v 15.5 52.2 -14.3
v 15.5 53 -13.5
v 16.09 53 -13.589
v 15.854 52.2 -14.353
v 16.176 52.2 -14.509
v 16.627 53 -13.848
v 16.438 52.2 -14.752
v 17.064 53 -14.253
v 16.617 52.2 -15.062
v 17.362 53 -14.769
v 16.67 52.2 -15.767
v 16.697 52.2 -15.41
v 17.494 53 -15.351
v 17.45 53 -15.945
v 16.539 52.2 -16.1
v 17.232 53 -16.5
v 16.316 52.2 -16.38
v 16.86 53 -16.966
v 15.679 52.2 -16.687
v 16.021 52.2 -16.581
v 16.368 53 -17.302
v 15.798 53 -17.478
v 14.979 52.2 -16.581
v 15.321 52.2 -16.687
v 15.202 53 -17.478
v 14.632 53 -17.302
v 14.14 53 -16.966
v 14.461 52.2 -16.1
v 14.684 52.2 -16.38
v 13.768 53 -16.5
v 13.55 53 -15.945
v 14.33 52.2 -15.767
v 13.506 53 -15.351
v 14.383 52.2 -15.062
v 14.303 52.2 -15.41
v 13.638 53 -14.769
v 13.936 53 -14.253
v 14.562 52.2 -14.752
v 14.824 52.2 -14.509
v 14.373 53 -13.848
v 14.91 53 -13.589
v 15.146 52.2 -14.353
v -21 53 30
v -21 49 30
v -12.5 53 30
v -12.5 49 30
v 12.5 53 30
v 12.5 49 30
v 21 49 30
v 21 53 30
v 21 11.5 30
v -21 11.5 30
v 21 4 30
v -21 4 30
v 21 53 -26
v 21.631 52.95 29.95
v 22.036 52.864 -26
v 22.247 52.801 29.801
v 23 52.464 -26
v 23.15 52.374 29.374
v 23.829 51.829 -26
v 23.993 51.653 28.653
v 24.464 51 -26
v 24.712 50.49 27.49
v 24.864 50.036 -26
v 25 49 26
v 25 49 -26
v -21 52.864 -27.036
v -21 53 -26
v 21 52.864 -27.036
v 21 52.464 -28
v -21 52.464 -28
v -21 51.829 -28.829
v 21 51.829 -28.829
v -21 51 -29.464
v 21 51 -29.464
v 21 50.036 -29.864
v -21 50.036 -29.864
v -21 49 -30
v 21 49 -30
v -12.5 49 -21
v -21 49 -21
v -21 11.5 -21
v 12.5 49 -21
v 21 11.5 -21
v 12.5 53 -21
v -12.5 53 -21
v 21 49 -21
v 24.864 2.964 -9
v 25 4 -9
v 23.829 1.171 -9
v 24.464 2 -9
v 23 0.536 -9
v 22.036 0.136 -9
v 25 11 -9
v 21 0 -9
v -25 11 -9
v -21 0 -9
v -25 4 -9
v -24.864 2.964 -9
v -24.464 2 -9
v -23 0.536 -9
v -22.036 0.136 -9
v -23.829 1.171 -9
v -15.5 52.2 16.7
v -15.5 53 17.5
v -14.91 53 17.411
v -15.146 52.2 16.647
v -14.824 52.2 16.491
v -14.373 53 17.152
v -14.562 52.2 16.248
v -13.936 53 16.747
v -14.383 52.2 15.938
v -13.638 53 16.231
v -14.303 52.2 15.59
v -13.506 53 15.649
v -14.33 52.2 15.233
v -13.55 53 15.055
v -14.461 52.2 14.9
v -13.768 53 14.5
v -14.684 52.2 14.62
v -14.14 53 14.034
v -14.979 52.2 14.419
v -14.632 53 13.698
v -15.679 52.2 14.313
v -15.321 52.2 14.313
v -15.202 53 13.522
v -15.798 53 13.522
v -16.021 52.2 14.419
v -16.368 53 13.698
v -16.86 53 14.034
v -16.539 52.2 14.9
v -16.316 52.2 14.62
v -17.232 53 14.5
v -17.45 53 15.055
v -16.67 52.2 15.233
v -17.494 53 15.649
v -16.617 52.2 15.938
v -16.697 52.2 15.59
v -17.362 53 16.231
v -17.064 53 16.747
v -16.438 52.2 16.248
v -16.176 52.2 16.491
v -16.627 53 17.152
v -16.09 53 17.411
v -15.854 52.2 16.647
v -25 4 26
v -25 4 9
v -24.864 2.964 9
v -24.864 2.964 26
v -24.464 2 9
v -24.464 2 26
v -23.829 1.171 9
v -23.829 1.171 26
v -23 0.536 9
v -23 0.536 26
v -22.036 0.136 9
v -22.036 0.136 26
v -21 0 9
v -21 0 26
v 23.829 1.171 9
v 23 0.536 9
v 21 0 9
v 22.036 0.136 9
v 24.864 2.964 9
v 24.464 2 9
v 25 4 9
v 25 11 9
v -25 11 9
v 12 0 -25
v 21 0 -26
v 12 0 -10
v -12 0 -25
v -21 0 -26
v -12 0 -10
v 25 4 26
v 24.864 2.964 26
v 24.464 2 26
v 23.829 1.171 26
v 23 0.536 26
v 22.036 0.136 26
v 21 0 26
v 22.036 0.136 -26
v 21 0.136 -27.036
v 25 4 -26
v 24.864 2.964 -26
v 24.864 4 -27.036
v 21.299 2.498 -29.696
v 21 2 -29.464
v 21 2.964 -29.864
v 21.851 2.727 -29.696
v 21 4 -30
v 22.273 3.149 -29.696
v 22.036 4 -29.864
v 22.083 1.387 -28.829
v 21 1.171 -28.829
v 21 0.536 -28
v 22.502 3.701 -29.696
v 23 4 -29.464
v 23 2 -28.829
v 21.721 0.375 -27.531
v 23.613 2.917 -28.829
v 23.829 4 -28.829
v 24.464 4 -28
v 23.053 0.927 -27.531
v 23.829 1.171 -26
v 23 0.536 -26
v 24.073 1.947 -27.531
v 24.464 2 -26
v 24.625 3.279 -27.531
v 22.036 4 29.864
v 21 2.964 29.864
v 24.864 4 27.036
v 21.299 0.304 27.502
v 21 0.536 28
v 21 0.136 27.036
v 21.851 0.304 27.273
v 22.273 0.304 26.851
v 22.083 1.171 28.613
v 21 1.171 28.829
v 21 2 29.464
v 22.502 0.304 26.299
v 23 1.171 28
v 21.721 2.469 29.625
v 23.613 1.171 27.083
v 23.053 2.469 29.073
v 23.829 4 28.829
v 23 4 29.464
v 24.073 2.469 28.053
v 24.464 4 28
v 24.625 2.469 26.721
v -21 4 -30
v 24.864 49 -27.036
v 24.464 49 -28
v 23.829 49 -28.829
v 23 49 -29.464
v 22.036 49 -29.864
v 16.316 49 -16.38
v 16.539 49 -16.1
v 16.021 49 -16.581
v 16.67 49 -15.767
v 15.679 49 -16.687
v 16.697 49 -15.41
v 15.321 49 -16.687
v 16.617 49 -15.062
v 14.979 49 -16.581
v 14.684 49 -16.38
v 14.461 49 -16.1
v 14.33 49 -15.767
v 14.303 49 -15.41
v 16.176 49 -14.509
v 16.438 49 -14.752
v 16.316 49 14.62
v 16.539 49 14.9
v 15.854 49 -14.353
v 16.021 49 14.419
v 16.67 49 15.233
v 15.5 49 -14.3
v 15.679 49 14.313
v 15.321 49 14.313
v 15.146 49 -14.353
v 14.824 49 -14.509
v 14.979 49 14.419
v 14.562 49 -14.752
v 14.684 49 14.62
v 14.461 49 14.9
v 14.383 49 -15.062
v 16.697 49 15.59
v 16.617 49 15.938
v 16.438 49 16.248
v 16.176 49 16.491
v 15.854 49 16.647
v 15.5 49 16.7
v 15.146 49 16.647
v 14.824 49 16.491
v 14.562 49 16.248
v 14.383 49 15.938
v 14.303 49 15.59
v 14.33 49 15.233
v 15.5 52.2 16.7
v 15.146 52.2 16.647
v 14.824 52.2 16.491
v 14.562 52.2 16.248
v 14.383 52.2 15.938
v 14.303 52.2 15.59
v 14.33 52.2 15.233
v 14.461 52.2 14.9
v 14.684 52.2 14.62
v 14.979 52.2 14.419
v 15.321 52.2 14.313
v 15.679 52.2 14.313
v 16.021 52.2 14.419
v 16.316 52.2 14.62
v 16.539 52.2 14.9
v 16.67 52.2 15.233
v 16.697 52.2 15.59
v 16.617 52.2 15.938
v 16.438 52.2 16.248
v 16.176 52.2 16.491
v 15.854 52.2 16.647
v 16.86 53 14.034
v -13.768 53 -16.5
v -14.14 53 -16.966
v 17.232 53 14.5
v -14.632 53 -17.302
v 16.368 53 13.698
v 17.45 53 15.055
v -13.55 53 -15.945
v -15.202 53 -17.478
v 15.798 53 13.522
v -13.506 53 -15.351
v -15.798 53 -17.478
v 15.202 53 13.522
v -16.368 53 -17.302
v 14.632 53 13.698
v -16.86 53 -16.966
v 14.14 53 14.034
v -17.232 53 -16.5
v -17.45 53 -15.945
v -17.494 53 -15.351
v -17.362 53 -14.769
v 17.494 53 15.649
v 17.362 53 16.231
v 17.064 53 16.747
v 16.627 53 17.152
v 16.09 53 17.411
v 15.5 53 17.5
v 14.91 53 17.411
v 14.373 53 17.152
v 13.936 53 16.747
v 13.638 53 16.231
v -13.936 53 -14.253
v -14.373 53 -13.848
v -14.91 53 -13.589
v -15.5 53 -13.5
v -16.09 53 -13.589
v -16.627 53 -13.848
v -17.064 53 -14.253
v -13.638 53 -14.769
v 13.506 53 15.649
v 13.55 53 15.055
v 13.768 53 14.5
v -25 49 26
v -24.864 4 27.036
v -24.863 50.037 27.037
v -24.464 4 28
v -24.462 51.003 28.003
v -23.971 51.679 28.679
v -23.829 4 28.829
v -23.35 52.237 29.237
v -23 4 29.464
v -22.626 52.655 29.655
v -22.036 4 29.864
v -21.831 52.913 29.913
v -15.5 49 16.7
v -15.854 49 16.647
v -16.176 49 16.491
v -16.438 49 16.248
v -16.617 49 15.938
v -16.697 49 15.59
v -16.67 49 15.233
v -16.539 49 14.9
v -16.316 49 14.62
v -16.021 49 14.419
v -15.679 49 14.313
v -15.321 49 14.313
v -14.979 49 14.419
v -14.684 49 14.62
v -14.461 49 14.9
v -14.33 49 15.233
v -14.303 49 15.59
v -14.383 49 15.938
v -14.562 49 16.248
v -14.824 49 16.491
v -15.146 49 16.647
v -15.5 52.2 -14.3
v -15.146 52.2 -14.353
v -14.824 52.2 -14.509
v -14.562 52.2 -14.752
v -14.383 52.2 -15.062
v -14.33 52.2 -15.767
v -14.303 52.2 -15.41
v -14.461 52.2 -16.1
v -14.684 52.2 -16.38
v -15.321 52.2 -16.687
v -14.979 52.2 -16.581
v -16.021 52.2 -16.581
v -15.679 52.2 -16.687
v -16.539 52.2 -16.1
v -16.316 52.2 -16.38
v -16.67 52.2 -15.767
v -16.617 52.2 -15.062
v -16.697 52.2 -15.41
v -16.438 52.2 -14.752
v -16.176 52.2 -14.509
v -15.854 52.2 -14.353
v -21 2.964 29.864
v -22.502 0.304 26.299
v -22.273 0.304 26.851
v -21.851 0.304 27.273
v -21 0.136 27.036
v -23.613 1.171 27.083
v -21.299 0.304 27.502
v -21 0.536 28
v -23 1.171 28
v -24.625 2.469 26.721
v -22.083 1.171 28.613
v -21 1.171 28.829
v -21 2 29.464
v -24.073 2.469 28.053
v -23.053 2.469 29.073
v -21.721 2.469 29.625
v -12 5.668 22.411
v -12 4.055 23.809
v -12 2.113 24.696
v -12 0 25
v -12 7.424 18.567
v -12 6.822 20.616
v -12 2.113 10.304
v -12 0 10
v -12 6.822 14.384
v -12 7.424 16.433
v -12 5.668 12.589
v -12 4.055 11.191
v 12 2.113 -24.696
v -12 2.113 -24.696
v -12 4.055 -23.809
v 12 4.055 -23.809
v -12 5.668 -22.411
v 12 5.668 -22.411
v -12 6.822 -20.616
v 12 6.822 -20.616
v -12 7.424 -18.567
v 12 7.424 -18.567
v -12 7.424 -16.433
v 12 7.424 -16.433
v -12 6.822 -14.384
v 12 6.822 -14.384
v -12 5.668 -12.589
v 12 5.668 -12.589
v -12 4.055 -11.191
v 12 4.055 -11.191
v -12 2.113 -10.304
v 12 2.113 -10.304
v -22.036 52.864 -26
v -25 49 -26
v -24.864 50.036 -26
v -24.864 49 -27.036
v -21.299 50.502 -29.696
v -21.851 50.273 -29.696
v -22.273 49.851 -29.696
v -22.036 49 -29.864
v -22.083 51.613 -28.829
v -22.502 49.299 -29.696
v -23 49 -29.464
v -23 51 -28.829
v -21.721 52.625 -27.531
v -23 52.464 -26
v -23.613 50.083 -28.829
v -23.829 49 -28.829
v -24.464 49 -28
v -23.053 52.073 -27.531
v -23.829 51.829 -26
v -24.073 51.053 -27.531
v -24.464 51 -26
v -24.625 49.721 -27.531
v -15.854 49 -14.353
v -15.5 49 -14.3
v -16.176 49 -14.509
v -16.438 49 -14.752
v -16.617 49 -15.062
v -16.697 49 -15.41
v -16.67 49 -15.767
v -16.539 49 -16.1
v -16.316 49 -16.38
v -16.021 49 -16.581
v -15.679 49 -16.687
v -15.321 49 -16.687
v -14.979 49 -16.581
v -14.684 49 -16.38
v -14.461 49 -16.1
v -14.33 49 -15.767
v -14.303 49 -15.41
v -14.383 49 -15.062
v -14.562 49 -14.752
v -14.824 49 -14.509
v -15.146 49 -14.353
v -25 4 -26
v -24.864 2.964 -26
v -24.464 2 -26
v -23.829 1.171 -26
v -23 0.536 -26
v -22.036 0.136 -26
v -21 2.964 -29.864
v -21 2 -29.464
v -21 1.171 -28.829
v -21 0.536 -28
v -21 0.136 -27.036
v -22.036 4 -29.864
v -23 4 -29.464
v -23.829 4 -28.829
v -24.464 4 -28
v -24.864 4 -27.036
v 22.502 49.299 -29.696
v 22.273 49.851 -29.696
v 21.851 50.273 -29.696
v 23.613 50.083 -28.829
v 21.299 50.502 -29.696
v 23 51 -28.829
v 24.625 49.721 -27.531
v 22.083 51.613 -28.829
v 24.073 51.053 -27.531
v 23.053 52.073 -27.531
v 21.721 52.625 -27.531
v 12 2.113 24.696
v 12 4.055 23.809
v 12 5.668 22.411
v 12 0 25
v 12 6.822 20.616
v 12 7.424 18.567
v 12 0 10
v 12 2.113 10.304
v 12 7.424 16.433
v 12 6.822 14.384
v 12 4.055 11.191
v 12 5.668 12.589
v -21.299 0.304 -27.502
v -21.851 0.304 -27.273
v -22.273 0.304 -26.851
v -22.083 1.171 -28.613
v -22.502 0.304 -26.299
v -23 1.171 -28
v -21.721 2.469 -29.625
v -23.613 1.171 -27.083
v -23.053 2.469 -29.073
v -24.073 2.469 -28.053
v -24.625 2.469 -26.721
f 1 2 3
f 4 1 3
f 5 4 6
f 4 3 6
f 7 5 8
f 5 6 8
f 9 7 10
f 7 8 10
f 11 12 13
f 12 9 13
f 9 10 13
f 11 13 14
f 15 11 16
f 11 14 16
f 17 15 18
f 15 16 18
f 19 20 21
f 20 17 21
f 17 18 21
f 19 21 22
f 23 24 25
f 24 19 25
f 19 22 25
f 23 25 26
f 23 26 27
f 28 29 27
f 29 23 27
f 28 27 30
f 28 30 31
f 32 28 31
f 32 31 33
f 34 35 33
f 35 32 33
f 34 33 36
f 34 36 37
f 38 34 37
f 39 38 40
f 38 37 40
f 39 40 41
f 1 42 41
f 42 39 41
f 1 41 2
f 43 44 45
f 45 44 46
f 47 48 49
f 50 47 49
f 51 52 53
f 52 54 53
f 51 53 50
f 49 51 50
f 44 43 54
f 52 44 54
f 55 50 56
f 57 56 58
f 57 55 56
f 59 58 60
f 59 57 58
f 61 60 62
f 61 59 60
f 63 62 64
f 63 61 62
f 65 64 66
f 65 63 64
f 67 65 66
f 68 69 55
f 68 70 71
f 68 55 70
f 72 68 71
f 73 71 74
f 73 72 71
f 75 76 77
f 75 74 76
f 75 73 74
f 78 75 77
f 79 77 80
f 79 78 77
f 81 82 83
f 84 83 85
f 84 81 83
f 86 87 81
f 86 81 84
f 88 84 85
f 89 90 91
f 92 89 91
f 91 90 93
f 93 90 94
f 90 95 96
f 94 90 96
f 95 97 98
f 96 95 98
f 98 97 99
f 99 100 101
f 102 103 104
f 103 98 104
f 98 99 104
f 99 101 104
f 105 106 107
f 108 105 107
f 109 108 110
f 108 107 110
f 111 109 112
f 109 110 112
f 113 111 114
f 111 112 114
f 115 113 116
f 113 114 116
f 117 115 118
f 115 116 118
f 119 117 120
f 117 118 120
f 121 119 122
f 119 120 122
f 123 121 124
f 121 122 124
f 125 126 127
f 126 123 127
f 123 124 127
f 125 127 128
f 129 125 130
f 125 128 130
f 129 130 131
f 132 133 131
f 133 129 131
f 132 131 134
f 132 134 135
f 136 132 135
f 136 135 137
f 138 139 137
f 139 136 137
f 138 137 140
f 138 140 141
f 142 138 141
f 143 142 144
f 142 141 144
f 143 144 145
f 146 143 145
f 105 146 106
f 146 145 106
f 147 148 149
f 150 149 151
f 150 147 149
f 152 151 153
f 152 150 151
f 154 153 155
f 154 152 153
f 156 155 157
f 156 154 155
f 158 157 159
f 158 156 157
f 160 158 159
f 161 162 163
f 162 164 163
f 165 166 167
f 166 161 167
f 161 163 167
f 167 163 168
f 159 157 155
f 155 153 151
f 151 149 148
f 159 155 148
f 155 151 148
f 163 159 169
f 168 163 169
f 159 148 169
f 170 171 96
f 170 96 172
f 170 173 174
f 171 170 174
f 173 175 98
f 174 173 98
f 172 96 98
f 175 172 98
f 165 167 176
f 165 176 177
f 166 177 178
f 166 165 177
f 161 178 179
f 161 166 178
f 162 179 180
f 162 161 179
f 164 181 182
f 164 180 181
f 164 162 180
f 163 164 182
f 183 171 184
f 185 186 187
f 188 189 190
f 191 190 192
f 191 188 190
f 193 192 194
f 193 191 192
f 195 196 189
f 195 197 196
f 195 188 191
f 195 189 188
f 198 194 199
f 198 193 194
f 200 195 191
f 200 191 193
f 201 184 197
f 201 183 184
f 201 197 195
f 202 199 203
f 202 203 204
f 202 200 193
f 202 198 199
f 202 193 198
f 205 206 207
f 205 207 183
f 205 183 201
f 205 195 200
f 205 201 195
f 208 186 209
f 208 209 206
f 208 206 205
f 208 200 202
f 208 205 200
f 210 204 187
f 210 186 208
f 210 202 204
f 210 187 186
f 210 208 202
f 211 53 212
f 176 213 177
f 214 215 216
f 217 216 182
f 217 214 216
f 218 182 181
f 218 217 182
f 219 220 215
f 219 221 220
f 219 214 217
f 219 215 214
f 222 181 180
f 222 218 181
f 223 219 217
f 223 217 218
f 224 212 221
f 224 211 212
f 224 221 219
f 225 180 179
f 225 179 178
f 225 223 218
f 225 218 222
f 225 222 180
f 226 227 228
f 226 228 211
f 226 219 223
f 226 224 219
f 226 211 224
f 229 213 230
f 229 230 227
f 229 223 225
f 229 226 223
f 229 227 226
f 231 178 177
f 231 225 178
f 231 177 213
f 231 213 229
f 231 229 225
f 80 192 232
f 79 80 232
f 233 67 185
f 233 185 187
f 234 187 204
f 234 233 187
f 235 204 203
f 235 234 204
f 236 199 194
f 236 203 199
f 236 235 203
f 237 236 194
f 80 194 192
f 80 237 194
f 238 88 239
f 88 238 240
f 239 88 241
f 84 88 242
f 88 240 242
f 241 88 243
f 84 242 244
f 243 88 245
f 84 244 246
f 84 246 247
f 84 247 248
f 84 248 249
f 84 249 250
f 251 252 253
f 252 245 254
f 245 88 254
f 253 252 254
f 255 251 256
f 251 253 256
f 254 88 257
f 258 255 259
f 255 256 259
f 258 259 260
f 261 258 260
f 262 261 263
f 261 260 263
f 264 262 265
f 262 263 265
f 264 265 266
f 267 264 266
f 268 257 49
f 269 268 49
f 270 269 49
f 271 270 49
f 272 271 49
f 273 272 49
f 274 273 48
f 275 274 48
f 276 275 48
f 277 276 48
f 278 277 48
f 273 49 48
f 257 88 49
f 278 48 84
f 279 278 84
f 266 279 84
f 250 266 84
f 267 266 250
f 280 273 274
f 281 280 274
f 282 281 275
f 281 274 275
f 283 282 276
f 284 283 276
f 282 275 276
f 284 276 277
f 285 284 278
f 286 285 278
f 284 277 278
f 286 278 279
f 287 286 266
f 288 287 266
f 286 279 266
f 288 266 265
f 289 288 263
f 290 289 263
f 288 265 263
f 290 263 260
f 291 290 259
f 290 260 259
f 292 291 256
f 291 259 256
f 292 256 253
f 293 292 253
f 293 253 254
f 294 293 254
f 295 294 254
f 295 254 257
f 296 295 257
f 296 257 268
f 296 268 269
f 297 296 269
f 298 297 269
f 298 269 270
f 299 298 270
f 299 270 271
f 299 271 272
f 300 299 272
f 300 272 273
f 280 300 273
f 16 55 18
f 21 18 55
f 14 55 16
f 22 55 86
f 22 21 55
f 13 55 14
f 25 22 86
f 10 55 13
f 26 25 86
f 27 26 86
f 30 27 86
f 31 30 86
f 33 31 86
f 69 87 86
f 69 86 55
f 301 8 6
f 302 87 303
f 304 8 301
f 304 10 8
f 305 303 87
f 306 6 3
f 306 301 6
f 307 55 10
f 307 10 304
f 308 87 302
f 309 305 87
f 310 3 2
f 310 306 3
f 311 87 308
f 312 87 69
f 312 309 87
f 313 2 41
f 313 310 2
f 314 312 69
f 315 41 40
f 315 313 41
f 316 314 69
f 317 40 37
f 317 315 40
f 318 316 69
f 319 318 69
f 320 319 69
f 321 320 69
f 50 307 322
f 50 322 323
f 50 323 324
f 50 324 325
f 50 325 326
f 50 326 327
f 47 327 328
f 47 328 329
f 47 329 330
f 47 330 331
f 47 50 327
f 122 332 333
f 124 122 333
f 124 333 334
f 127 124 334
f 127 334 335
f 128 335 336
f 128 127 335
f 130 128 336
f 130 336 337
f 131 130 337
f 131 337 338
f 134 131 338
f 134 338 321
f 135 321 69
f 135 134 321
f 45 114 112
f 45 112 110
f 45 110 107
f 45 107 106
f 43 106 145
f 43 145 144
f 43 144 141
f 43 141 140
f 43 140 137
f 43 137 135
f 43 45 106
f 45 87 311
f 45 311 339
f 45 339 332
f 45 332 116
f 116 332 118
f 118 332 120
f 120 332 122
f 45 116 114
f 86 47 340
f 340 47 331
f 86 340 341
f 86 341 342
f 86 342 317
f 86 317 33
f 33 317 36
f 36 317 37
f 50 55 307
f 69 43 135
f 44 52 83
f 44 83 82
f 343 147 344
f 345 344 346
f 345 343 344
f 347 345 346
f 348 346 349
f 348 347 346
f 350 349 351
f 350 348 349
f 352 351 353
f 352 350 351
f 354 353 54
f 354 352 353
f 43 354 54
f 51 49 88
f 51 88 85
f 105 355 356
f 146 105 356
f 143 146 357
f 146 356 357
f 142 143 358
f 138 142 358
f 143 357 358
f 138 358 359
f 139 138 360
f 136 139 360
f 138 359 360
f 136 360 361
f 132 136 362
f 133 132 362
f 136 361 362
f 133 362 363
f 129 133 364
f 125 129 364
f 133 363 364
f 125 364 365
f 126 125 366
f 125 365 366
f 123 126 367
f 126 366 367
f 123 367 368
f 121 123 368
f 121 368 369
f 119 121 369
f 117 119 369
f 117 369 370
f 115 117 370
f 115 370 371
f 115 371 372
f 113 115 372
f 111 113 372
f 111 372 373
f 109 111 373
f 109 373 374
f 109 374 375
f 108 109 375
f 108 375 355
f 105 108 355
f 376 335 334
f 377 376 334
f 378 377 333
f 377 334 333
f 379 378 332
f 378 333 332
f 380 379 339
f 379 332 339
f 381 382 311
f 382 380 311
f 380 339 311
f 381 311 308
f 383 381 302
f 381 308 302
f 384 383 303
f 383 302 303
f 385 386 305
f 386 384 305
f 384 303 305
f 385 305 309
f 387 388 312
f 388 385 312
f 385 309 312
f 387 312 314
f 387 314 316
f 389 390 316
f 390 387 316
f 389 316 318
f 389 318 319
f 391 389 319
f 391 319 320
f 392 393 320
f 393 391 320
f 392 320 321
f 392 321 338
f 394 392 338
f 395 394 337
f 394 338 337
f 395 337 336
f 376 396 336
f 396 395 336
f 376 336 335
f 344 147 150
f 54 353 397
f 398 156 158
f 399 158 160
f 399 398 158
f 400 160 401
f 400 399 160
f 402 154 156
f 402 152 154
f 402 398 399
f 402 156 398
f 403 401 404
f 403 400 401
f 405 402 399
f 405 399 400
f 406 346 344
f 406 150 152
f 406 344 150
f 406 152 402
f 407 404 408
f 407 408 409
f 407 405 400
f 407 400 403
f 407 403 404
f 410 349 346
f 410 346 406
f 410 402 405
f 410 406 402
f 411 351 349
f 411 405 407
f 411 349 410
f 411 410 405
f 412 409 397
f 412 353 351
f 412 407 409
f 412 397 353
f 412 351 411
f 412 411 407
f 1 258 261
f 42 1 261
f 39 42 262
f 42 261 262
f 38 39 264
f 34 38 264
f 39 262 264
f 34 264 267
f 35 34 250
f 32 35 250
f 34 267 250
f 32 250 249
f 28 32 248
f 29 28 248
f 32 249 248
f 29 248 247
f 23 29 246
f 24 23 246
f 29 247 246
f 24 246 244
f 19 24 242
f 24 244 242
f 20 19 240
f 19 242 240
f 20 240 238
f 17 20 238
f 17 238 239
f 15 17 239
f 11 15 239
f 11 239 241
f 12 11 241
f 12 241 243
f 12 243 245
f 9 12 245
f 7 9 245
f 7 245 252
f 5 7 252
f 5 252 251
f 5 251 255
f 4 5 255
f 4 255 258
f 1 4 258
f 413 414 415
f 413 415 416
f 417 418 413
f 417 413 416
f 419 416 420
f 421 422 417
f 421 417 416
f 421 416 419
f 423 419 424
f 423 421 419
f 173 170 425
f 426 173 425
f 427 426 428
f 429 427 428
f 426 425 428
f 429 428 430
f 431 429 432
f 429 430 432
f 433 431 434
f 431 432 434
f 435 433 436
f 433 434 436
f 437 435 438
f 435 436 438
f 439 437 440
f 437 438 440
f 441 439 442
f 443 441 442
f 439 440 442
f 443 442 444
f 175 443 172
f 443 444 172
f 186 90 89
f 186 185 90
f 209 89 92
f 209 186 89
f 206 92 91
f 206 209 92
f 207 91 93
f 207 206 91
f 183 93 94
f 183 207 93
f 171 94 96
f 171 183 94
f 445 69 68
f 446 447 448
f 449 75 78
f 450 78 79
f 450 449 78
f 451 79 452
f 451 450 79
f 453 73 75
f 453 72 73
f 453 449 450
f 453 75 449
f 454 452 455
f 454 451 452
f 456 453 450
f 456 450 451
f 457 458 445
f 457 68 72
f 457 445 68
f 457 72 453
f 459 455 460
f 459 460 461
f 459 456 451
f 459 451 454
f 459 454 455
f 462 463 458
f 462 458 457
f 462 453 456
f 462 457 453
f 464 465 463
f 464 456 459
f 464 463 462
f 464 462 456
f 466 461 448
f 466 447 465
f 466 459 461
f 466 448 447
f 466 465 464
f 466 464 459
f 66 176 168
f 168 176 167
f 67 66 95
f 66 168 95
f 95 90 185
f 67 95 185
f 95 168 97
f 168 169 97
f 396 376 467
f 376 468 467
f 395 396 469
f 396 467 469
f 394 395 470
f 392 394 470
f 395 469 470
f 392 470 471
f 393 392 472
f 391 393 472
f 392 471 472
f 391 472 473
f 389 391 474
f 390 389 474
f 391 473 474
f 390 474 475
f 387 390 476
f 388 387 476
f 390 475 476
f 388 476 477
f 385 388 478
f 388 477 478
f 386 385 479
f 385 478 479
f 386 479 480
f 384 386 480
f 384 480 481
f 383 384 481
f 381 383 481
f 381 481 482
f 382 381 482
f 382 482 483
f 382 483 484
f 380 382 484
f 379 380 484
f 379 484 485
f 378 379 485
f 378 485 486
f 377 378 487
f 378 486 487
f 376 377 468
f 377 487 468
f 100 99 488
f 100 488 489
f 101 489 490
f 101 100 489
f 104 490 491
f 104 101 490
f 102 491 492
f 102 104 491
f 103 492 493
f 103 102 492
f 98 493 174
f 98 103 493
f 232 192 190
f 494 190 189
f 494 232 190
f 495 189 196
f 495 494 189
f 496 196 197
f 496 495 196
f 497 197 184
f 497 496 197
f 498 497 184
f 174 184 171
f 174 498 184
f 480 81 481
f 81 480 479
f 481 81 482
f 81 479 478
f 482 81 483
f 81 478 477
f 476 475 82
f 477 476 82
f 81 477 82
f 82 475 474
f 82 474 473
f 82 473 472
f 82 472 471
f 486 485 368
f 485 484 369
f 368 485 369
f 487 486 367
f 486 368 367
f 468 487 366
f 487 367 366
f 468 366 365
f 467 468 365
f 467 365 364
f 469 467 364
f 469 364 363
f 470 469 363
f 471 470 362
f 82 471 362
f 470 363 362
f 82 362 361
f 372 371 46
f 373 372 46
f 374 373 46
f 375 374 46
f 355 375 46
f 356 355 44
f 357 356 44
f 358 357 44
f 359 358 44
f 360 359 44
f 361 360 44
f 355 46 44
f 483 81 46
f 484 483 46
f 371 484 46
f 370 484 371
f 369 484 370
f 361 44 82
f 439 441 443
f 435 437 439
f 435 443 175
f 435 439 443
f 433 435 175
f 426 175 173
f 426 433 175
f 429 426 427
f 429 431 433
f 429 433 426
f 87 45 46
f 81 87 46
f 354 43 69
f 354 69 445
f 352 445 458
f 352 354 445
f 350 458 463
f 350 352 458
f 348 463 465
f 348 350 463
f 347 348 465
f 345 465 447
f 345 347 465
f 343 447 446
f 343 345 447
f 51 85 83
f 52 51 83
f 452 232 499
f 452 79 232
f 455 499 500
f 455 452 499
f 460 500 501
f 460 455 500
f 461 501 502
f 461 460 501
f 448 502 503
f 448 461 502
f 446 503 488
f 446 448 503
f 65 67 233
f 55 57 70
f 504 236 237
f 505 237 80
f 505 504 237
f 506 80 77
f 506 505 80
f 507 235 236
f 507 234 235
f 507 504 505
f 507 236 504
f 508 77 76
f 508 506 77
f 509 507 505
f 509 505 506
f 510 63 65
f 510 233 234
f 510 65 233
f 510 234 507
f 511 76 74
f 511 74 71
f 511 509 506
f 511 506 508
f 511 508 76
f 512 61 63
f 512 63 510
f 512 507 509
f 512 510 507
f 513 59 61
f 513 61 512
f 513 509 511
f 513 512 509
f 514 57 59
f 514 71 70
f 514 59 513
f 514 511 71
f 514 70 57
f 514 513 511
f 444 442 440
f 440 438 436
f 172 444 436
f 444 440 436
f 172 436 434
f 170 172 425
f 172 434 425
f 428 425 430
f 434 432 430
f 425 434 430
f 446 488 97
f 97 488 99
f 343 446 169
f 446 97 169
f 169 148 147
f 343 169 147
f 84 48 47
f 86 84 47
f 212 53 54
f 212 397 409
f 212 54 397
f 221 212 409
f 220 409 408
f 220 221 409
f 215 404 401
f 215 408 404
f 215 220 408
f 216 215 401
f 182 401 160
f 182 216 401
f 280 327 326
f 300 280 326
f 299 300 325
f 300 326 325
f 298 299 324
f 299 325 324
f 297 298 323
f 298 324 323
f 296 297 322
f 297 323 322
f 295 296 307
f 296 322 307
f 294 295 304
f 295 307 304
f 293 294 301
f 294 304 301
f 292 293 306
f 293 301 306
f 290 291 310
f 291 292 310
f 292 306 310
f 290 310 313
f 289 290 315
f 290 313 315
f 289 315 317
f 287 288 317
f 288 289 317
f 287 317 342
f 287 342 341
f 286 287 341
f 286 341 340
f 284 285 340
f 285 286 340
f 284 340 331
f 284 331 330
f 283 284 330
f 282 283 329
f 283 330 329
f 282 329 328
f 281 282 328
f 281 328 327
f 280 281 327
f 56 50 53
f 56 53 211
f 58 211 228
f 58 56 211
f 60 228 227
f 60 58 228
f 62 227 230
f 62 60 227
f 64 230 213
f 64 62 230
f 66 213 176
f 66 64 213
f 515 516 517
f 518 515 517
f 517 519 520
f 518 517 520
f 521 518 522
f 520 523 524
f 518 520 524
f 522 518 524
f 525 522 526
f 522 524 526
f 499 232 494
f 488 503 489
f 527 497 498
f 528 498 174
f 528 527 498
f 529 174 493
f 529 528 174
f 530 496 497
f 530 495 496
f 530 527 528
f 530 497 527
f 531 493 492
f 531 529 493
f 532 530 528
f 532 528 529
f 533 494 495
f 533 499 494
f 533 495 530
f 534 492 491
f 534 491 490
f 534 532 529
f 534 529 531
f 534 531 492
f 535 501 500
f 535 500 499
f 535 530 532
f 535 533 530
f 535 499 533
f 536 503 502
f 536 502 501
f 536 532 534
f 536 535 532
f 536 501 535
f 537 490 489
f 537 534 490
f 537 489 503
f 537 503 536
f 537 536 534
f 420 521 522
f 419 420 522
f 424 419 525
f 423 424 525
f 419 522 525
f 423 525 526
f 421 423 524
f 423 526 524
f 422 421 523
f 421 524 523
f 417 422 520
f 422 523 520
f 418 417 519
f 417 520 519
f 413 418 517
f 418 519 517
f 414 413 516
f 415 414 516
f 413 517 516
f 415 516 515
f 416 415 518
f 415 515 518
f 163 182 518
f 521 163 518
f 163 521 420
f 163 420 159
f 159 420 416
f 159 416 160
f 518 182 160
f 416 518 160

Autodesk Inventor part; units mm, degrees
ref_plane "YZ Plane" through (0, 0, 0) normal (1, 0, 0) x (0, 1, 0)
ref_plane "XZ Plane" through (0, 0, 0) normal (0, 1, 0) x (-1, 0, 0)
ref_plane "XY Plane" through (0, 0, 0) normal (0, 0, 1) x (1, 0, 0)
sketch "Sketch1" plane through (0, 0, 0) normal (0, 1, 0) x (-1, 0, 0)
  line L0 (-25, -30) -> (25, -30)
  line L1 (25, -30) -> (25, 30)
  line L2 (25, 30) -> (-25, 30)
  line L3 (-25, 30) -> (-25, -30)
  line L4 (-25, -30) -> (25, 30) construction
  line L5 (25, -30) -> (-25, 30) construction
  point P0 (0, 0)
  dimension "d0" = 50
  dimension "d1" = 60
extrude "Extrusion1" add sketch "Sketch1" along normal blind 53
sketch "Sketch2" plane through (-25, 0, 30) normal (0, 0, 1) x (1, 0, 0)
  line L0 (0, 0) -> (0, 53) projected
  line L1 (50, 0) -> (50, 53) projected
  line L2 (0, 53) -> (50, 53)
  line L3 (50, 53) -> (50, 49)
  line L4 (50, 49) -> (0, 49)
  line L5 (0, 49) -> (0, 53)
  line L6 (12.5, 49) -> (37.5, 49)
  line L7 (37.5, 49) -> (37.5, 57)
  line L8 (37.5, 57) -> (12.5, 57)
  line L9 (12.5, 57) -> (12.5, 49)
  line L10 (0, 53) -> (50, 53) projected
  line L11 (12.5, 49) -> (37.5, 57) construction
  line L12 (37.5, 49) -> (12.5, 57) construction
  line L13 (25, 49) -> (25, 11.5)
  line L14 (46, 11.5) -> (4, 11.5)
  line L15 (4, 11.5) -> (4, 49)
  line L16 (4, 49) -> (46, 49)
  line L17 (46, 49) -> (46, 11.5)
  line L18 (46, 11.5) -> (4, 49) construction
  line L19 (4, 11.5) -> (46, 49) construction
  point P0 (25, 0)
  point P1 (25, 53)
  point P2 (25, 30.25)
  point P3 (37.5, 49)
  point P4 (37.5, 53)
  point P5 (12.5, 53)
  point P6 (12.5, 49)
  dimension "d4" = 4
  dimension "d5" = 25
  dimension "d6" = 8
  dimension "d7" = 37.5
  dimension "d8" = 42
extrude "Extrusion2" cut sketch "Sketch2" against normal blind 51 contours L4 L13 L14 L15 | L2 L7 L4 L9 | L4 L17 L14 L13
sketch "Sketch3" plane through (25, 0, 30) normal (1, 0, 0) x (0, 0, -1)
  line L0 (30, 0) -> (12.5, 0)
  line L1 (12.5, 0) -> (47.5, 0)
  line L2 (0, 0) -> (60, 0) projected
  circle A0 centre (12.5, 0) radius 7.5
  circle A1 centre (47.5, 0) radius 7.5
  point P0 (55, 0)
  point P1 (40, 0)
  point P2 (20, 0)
  point P3 (5, 0)
  dimension "d11" = 17.5
  dimension "d12" = 35
  dimension "d13" = 15
  dimension "d14" = 15
extrude "Extrusion3" cut sketch "Sketch3" against normal blind 37 contours L0 L2 A0 | A1 L2 L1 picked at (17.141, 1.7601) picked at (45.1933, 4.395)
extrude "Extrusion4" add sketch "Sketch3" against normal blind 13 contours L0 L2 A0 | A1 L2 L1 picked at (17.141, 1.7601) picked at (45.1933, 4.395)
fillet "Fillet1" radius 4 11 edges at (25, 53, 0) (-25, 53, 0) (25, 26.5, 30) (-25, 26.5, 30) (25, 0, 0) (25, 26.5, -30) (0, 53, -30) (-25, 26.5, -30) (-25, 0, 0) (0, 0, 30) (0, 0, -30)
sketch "Sketch4" plane through (-25, 4, 26) normal (-1, 0, 0) x (0, 0, 1)
  line L0 (-35, -15) -> (-17, -15)
  line L1 (-17, -15) -> (-17, 7)
  line L2 (-17, 7) -> (-35, 7)
  line L3 (-35, 7) -> (-35, -15)
  line L4 (-35, -15) -> (-17, 7) construction
  line L5 (-17, -15) -> (-35, 7) construction
  point P0 (-26, -4)
  dimension "d20" = 18
  dimension "d21" = 22
extrude "Extrusion5" cut sketch "Sketch4" against normal through all
sketch "Sketch5" plane through (0, 53, 0) normal (0, 1, 0) x (1, 0, 0)
  line L0 (-12.5, 21) -> (12.5, 21) projected
  line L1 (0, 21) -> (0, -21)
  line L2 (0, 21) -> (42, 21) construction
  line L3 (15.5, 15.5) -> (-15.5, 15.5)
  line L4 (-15.5, 15.5) -> (-15.5, -15.5)
  line L5 (-15.5, -15.5) -> (15.5, -15.5)
  line L6 (15.5, -15.5) -> (15.5, 15.5)
  line L7 (15.5, 15.5) -> (-15.5, -15.5) construction
  line L8 (-15.5, 15.5) -> (15.5, -15.5) construction
  point P0 (0, 0)
  dimension "d24" = 42
  dimension "d25" = 90
  dimension "d26" = 31
  dimension "d27" = 31
hole "Hole1" at (15.5, 53, 15.5) at (15.5, 53, -15.5) at (-15.5, 53, -15.5) at (-15.5, 53, 15.5) direction (0, -1, 0) diameter 2.4 depth 4 countersink diameter 4 countersink angle 90
properties part number "Joint_Bearings"
